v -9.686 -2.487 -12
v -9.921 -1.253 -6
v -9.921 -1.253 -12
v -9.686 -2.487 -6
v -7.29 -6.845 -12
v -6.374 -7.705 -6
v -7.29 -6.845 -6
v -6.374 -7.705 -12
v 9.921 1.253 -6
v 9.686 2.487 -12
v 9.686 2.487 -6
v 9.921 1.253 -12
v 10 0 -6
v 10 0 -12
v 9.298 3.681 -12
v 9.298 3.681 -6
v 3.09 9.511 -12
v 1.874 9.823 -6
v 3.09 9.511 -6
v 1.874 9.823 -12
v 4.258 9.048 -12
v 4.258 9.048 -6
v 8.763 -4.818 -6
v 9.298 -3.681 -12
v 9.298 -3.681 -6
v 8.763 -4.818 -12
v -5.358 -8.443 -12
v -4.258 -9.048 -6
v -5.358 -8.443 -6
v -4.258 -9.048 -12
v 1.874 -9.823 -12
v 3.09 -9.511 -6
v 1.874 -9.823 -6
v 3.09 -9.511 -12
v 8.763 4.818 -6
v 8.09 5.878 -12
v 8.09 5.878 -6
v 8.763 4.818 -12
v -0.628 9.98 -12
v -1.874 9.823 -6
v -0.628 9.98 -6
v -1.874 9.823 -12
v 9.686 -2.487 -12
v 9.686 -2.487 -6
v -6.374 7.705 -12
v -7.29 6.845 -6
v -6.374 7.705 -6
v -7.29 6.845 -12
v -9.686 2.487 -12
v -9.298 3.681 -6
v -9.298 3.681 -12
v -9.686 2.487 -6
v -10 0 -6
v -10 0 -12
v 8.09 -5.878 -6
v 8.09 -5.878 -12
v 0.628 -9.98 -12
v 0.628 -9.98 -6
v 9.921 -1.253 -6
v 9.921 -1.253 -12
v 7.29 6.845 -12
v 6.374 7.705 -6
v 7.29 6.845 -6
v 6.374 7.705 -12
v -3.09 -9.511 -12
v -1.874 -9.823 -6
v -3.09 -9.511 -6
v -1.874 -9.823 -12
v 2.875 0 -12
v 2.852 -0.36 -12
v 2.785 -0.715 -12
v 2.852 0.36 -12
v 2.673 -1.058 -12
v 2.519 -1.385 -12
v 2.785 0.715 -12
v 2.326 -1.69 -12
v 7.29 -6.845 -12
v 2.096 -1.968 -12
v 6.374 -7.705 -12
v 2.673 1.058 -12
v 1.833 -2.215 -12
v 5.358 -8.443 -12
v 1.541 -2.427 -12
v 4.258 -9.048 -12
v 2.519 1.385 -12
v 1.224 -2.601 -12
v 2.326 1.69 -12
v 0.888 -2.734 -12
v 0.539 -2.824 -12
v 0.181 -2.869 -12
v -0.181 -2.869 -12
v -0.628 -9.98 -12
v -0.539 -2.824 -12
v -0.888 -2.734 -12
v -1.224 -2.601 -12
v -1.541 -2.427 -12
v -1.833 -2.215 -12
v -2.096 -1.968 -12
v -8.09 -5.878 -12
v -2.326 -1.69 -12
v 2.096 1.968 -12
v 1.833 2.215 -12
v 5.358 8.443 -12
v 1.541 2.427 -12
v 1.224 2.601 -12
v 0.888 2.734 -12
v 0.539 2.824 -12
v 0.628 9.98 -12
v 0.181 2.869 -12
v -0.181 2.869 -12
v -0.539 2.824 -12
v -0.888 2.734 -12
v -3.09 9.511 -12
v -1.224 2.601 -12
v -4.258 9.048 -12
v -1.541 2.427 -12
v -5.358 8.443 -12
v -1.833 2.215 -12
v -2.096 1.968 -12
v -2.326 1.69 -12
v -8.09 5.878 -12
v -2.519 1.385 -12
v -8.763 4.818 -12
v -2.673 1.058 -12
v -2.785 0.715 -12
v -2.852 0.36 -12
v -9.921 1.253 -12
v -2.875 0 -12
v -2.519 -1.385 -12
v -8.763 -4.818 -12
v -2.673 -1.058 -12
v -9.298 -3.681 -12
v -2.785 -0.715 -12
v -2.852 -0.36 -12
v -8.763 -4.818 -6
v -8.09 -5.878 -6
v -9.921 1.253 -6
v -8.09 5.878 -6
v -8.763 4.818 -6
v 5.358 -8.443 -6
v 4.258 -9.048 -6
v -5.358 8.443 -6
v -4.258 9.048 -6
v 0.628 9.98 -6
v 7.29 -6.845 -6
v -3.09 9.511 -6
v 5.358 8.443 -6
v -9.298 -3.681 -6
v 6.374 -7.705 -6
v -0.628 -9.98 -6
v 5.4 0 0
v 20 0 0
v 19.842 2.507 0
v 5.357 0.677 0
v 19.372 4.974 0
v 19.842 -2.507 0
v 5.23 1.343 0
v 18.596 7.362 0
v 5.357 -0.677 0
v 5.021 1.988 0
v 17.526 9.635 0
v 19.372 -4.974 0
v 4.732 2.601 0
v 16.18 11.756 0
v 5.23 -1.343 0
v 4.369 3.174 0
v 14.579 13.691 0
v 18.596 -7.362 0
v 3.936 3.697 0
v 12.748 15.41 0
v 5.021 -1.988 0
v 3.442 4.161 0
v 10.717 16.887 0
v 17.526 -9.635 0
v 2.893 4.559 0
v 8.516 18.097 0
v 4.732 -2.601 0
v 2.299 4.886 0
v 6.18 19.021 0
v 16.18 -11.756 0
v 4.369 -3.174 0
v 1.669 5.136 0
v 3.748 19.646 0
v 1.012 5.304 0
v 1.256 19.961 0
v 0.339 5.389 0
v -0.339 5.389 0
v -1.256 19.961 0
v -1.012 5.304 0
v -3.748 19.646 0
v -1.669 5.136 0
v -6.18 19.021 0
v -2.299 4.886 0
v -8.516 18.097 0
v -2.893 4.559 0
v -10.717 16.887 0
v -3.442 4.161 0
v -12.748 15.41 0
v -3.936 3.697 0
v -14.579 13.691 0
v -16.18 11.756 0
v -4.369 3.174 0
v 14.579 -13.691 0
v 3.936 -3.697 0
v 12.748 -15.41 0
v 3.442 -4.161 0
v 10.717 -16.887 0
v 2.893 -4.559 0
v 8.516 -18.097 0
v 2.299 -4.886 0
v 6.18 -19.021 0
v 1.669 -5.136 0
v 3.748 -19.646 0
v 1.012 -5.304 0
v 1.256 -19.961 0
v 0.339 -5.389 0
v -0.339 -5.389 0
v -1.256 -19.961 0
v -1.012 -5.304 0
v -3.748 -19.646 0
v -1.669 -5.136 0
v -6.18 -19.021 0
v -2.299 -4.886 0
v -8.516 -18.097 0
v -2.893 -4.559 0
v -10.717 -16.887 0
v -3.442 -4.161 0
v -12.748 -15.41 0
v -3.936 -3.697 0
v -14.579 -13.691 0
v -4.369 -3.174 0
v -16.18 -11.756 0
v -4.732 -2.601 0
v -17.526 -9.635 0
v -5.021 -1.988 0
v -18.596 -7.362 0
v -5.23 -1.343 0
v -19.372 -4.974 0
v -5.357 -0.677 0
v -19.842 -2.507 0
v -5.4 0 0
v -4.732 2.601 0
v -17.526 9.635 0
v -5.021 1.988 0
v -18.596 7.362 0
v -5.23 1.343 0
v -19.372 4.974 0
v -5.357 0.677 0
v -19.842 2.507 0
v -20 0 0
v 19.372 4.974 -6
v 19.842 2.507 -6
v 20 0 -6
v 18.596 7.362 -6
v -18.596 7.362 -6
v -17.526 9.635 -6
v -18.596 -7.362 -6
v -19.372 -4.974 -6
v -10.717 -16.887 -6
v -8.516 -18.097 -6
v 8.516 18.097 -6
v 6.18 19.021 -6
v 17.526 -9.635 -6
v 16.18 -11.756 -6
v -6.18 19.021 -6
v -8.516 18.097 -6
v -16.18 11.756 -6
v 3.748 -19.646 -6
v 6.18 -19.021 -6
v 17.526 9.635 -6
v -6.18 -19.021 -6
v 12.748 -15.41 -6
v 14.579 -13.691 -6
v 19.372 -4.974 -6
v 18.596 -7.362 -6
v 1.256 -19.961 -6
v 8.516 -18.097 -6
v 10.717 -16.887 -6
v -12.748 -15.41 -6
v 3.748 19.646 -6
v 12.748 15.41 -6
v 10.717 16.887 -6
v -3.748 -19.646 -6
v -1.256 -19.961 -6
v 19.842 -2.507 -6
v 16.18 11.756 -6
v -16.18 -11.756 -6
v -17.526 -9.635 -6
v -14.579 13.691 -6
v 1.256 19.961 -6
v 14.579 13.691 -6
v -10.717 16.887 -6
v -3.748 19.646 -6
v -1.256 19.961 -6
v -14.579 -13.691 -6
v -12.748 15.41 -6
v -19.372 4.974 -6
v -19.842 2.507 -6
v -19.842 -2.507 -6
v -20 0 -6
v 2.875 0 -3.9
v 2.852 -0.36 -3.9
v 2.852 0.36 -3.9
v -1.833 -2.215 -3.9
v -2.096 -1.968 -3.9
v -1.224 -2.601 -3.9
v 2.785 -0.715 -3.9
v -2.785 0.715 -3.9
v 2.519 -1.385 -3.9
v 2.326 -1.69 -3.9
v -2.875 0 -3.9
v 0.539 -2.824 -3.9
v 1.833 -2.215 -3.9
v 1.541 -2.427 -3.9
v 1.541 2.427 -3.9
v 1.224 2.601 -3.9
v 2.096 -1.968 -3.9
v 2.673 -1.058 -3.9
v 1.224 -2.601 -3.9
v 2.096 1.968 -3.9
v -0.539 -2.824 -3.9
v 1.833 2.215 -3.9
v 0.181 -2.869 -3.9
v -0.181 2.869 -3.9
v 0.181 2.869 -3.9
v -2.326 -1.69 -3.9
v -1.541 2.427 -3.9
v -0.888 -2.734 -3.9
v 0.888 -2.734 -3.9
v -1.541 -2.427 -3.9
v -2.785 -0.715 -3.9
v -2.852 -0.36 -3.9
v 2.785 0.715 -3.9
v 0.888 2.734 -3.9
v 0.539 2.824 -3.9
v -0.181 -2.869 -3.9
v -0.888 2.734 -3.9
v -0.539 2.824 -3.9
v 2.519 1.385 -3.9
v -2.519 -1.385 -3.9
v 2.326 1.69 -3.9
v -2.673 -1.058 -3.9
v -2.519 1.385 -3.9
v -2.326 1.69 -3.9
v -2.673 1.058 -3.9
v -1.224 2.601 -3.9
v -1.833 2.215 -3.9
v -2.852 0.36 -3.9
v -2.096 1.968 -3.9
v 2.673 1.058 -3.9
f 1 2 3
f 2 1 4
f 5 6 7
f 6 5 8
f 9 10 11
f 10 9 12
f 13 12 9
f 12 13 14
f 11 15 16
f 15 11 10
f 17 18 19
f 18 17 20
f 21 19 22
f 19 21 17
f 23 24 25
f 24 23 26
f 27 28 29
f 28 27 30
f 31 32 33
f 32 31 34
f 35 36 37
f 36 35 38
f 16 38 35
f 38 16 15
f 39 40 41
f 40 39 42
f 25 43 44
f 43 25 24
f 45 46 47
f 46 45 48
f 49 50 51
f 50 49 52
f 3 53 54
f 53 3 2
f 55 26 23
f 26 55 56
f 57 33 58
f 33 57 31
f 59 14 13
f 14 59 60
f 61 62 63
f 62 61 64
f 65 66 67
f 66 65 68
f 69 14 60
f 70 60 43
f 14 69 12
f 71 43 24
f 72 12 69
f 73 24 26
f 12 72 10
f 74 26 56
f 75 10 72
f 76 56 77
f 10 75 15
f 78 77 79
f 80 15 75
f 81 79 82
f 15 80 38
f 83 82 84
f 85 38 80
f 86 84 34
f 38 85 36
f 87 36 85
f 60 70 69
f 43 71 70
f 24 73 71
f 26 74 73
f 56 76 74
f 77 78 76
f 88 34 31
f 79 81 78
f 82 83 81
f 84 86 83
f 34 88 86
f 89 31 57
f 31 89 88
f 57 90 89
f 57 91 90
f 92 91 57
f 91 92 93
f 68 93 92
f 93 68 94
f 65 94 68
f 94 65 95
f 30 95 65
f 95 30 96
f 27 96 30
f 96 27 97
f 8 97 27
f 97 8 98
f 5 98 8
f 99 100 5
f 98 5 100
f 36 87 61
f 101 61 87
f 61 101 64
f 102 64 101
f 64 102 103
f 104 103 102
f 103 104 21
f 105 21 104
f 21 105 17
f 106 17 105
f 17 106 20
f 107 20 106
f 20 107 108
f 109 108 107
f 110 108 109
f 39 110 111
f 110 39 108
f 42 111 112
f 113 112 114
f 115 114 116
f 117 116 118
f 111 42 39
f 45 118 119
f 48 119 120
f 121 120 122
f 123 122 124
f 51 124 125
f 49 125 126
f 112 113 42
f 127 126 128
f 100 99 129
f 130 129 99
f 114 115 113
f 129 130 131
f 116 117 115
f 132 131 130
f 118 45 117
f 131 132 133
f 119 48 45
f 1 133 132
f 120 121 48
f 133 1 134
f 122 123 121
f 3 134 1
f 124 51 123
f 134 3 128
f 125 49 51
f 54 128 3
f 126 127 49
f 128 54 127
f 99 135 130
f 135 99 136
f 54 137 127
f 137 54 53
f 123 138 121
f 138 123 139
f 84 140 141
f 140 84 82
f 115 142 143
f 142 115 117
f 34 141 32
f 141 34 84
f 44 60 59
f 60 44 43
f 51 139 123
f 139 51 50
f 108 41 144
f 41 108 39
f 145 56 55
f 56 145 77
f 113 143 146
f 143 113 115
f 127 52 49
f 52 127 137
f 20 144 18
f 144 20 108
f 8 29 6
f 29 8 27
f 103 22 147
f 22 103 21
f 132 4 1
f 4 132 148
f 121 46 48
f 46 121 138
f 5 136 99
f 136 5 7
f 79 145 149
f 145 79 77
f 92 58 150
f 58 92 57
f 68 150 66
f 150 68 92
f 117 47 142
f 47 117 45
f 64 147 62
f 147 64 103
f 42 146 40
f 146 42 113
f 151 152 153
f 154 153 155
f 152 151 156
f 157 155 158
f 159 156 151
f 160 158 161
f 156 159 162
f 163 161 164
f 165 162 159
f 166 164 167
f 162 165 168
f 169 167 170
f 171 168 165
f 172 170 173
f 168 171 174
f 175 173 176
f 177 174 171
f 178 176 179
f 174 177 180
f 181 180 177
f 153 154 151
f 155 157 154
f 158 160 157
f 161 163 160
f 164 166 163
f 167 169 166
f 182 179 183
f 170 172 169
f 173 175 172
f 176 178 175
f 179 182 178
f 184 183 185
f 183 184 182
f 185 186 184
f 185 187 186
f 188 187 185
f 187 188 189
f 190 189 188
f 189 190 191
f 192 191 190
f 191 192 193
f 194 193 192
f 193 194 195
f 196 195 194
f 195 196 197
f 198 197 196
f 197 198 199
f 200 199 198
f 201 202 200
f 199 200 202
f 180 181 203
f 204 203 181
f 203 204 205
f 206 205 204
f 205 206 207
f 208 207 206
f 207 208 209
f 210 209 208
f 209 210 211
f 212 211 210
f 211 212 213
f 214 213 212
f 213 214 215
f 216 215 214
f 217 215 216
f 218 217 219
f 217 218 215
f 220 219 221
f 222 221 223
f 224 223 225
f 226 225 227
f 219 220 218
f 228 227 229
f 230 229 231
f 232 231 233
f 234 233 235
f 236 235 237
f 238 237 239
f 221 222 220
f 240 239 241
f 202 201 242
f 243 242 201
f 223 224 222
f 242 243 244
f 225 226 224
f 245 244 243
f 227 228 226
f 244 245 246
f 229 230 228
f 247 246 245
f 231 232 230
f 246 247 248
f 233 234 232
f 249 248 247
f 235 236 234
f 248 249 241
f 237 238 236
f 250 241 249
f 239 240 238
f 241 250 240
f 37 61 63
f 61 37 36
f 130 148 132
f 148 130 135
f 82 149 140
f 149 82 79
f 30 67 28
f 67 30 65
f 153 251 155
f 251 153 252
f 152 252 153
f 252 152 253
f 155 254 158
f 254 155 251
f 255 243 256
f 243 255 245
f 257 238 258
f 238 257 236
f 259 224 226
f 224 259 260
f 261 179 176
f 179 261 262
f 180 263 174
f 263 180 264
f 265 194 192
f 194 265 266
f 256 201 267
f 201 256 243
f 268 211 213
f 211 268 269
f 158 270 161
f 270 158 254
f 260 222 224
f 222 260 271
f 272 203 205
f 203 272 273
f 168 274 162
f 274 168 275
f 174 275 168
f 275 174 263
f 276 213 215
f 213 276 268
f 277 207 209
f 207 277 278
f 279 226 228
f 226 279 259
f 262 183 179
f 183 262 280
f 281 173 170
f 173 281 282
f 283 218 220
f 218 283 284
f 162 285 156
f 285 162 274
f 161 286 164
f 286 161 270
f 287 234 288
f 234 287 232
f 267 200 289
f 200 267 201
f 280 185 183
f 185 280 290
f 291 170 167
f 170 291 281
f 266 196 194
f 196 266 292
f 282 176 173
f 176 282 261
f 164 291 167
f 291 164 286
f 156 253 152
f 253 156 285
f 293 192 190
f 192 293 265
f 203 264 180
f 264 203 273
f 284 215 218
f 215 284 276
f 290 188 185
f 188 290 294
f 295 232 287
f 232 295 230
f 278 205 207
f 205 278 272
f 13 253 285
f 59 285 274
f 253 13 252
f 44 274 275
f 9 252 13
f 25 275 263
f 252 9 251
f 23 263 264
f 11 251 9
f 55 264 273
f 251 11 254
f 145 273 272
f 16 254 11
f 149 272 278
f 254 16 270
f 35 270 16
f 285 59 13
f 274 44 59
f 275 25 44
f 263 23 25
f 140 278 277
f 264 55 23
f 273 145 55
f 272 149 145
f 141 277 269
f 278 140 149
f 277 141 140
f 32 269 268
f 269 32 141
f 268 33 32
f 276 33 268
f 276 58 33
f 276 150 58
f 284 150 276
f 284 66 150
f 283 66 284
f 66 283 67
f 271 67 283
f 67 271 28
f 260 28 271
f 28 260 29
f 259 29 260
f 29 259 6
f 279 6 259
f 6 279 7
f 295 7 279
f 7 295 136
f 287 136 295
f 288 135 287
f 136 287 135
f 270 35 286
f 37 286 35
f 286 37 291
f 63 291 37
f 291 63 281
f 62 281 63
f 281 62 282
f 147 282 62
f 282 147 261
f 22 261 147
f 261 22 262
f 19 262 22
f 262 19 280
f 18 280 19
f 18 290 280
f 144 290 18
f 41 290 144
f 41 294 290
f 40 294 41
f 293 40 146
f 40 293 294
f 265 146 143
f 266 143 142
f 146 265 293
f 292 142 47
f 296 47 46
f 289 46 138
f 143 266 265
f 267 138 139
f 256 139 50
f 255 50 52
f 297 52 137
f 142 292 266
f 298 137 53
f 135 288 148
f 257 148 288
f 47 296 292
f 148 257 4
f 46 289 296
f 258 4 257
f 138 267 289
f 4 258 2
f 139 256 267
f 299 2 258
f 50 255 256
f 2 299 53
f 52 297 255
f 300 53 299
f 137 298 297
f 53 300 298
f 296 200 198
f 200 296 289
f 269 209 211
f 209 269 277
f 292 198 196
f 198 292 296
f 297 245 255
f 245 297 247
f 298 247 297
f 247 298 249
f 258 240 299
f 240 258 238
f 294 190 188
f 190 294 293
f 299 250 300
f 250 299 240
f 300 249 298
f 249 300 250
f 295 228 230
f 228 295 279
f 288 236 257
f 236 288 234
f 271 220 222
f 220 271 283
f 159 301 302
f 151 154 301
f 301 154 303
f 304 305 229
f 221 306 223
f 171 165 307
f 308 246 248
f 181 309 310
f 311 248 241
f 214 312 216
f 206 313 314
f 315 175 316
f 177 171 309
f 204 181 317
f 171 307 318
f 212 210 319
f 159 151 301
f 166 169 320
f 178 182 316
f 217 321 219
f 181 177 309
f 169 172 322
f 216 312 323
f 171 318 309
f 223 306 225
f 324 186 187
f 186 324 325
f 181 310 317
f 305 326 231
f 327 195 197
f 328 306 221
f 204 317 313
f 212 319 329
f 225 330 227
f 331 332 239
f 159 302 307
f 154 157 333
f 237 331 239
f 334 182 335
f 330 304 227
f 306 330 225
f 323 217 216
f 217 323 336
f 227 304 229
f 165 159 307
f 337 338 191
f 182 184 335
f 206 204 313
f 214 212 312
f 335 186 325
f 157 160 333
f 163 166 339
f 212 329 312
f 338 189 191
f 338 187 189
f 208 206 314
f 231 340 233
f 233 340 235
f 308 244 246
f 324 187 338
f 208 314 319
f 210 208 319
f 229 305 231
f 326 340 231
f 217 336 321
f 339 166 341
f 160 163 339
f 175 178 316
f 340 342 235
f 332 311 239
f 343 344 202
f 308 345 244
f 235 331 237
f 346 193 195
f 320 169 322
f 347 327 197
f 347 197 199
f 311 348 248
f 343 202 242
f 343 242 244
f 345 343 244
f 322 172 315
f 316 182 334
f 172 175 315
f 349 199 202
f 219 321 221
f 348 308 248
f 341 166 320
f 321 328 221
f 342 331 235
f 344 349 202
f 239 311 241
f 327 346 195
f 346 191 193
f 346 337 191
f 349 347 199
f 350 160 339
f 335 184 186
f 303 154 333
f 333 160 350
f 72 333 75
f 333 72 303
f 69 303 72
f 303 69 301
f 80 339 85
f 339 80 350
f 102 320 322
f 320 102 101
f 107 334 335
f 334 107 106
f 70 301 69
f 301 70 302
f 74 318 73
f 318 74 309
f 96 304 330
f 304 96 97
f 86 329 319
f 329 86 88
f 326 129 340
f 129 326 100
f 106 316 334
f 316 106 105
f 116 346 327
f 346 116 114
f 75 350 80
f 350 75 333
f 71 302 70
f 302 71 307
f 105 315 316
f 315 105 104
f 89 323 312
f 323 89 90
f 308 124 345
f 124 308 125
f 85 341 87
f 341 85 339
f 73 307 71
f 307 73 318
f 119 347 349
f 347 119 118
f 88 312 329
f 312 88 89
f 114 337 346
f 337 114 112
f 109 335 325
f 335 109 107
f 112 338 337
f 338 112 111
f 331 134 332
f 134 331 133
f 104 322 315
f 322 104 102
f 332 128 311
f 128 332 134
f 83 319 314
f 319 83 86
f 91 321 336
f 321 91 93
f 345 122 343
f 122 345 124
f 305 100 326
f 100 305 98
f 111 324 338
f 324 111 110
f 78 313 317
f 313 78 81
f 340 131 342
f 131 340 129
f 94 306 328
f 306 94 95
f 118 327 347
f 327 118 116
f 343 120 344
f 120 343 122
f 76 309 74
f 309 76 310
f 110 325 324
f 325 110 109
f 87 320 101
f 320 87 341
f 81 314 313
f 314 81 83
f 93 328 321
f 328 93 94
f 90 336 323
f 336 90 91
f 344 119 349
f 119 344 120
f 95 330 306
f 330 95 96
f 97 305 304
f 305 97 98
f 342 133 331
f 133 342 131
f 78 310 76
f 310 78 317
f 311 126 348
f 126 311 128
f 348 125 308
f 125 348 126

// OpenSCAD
$fn = 50;


difference() {
	union() {
		translate(v = [0, 0, -12.0000000000]) {
			cylinder(h = 12, r = 10.0000000000);
		}
		translate(v = [0, 0, -6.0000000000]) {
			cylinder(h = 6, r = 20.0000000000);
		}
	}
	union() {
		translate(v = [0, 0, 0]) {
			rotate(a = [0, 0, 0]) {
				difference() {
					union() {
						#translate(v = [0, 0, -12.0000000000]) {
							cylinder(h = 12, r = 2.6000000000);
						}
						#translate(v = [0, 0, -3.9000000000]) {
							cylinder(h = 3.9000000000, r1 = 2.8750000000, r2 = 5.4000000000);
						}
						#translate(v = [0, 0, -12.0000000000]) {
							cylinder(h = 12, r = 2.8750000000);
						}
						#translate(v = [0, 0, -12.0000000000]) {
							cylinder(h = 12, r = 2.6000000000);
						}
					}
					union();
				}
			}
		}
	}
}
